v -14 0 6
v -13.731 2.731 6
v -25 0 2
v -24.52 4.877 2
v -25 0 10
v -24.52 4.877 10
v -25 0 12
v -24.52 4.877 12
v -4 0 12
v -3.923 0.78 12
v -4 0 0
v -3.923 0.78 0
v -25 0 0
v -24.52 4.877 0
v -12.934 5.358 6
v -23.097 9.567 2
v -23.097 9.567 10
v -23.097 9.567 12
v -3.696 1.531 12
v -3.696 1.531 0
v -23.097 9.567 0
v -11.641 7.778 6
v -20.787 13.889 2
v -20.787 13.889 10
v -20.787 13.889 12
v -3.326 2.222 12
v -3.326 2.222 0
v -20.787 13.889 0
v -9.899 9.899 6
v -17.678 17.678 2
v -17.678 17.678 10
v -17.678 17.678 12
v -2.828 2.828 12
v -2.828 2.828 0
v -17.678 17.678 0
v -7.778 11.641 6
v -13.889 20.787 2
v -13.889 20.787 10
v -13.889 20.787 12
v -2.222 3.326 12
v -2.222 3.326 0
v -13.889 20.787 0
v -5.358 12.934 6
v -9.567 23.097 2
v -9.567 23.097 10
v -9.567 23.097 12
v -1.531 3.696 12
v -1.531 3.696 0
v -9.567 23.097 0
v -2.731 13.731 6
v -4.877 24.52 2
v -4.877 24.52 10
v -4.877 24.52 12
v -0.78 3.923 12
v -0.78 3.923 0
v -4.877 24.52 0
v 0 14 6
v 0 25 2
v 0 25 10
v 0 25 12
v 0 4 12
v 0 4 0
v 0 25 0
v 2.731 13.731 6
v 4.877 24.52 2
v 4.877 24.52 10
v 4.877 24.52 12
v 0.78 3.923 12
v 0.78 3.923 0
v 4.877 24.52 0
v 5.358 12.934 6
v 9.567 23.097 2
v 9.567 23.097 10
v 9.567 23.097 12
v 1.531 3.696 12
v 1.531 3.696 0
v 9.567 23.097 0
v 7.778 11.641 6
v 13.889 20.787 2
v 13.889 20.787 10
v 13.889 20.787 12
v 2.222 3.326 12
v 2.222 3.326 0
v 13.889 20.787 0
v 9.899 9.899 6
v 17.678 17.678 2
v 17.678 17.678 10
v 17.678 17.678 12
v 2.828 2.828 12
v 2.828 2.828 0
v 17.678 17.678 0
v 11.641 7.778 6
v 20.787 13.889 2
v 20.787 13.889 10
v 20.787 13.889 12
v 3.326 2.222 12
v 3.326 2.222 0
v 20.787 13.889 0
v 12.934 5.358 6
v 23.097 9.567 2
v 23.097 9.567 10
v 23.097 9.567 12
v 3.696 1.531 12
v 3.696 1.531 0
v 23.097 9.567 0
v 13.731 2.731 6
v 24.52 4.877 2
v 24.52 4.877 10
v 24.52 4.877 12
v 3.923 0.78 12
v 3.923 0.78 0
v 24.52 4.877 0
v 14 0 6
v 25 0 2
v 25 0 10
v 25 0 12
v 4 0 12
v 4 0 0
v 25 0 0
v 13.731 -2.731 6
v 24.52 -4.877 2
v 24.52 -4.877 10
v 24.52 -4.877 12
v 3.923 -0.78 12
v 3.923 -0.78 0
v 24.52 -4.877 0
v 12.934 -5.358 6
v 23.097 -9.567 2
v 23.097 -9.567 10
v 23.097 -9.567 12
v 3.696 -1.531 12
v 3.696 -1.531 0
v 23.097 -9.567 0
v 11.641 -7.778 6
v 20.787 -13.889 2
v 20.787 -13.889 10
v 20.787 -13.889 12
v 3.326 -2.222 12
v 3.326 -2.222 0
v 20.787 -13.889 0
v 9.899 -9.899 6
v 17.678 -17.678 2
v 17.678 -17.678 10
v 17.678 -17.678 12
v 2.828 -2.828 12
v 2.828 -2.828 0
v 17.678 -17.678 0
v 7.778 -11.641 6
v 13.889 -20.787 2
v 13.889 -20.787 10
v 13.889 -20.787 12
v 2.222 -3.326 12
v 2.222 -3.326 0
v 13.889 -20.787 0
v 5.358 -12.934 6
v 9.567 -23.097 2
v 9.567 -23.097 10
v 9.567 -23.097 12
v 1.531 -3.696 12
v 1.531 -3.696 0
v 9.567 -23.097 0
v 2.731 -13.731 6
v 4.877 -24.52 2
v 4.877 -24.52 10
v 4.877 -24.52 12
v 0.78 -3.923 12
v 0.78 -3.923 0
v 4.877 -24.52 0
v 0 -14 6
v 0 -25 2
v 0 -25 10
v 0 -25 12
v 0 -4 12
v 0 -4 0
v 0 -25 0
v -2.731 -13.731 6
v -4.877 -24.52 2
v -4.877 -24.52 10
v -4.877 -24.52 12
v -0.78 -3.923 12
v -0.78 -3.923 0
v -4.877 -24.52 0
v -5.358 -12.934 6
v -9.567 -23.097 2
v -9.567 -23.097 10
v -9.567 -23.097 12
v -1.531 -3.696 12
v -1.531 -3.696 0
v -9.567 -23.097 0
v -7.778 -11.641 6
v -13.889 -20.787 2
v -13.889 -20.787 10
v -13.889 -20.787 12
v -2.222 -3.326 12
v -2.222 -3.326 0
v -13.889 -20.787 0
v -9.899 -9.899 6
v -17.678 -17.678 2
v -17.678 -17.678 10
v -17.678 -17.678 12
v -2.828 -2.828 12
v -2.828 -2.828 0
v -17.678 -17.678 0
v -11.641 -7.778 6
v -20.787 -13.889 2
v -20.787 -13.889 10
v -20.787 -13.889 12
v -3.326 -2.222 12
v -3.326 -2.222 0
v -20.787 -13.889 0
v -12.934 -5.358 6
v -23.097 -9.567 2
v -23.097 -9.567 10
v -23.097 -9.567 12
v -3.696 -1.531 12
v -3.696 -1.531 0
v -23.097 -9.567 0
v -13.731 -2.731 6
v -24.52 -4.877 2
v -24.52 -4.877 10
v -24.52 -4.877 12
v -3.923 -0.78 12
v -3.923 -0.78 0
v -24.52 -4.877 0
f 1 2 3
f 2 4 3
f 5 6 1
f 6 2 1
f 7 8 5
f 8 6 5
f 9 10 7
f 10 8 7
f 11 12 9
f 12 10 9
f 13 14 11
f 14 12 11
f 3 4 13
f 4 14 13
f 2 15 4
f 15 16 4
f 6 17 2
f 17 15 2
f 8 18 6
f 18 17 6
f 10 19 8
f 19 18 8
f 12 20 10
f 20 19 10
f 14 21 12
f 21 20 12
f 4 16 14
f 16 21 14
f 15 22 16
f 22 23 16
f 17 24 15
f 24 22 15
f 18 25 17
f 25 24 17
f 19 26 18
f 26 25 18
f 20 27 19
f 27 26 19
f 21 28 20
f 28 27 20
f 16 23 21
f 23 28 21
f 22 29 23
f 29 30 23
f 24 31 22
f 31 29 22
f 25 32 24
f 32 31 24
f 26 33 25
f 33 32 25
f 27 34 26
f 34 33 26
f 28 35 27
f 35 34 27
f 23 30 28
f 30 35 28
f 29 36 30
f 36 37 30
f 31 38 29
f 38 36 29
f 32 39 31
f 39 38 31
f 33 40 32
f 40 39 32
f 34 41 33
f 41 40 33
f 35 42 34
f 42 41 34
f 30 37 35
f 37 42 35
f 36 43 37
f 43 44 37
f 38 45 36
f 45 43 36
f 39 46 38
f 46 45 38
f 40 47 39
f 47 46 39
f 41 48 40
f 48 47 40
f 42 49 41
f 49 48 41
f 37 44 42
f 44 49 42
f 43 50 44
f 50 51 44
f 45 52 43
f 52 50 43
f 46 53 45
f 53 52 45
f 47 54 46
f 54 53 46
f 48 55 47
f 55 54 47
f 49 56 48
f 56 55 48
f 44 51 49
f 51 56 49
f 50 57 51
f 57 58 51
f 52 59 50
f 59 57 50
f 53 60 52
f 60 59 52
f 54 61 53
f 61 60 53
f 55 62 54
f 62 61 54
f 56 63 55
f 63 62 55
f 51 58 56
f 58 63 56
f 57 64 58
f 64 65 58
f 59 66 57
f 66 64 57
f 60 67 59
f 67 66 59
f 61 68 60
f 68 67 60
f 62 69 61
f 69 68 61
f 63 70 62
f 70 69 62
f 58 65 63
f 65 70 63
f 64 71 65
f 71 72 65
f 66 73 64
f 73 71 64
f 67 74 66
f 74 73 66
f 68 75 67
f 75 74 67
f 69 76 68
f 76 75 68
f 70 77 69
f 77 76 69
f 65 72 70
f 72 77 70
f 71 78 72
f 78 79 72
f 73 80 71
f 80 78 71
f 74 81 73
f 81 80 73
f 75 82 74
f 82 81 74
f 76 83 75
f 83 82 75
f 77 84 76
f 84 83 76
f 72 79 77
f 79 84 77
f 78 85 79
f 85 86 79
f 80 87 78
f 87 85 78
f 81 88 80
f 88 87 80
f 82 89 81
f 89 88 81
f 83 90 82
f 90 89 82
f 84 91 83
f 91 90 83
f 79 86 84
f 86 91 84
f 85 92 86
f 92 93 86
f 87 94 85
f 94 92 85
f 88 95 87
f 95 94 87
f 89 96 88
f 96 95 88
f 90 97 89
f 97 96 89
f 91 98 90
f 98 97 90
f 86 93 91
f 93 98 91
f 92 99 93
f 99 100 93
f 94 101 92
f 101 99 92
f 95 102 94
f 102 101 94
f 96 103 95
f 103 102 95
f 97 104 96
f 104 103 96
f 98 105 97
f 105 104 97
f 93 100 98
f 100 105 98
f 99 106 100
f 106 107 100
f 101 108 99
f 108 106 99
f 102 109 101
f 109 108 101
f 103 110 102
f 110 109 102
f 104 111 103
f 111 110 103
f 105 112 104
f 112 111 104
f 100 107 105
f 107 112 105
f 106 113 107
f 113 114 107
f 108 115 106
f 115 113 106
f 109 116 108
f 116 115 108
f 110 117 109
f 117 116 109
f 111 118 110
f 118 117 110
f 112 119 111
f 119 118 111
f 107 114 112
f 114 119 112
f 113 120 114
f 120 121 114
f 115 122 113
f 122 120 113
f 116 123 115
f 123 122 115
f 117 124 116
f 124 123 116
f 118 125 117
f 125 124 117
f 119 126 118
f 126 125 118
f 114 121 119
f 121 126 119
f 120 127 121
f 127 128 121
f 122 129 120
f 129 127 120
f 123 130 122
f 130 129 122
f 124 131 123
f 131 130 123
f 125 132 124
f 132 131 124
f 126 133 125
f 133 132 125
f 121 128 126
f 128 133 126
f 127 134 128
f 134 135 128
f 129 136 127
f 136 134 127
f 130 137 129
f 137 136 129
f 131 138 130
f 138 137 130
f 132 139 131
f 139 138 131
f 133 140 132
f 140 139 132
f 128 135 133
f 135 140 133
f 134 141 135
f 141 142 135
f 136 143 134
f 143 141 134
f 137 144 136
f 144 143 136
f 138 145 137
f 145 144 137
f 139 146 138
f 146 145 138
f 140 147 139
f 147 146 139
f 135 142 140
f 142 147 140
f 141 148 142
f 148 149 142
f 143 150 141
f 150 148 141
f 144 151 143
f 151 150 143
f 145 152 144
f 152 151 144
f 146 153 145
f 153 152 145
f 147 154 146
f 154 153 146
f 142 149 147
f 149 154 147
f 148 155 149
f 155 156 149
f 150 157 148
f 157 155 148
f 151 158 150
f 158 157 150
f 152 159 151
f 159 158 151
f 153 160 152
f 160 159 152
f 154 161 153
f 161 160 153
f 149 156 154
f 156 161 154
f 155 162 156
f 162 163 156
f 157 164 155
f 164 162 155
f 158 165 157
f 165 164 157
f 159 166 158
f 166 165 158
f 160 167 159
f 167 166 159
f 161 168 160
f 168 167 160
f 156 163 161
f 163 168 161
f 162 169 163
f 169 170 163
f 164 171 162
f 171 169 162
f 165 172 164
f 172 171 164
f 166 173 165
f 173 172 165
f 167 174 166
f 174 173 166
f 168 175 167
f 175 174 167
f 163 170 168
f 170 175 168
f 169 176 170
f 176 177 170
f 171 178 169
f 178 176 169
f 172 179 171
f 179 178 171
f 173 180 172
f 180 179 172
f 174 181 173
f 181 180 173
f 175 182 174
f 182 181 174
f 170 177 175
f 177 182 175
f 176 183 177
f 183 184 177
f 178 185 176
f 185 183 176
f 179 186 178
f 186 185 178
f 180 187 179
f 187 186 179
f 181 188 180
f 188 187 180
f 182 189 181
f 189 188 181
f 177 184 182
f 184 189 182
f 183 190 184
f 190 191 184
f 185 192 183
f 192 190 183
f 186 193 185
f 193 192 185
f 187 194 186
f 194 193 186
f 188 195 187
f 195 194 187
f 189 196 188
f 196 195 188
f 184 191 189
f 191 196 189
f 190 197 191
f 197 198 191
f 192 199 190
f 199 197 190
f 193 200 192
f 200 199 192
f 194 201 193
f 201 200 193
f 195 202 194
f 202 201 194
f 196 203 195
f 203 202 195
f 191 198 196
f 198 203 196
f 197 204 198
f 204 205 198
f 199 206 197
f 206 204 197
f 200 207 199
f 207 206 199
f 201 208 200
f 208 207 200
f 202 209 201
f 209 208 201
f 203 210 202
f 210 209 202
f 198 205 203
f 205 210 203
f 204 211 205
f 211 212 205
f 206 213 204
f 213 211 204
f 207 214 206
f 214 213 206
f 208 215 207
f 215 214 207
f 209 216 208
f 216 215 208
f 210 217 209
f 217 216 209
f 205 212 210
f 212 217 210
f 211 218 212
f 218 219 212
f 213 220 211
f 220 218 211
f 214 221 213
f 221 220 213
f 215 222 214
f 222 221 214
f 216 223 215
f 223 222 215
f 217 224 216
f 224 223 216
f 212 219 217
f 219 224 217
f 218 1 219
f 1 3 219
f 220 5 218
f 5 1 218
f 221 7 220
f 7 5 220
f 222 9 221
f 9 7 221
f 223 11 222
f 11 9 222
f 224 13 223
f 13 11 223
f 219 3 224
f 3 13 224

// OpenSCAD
$fn = 32;

// ----------------------------------------------------------------------
// Revolved part: V-groove pulley R25
// ----------------------------------------------------------------------

// --- parameters (mm) ---
bore_r = 4;               // bore radius
rim_r = 25;               // rim radius
rim_t = 12;               // rim width
groove_r = 14;            // groove root radius
groove_w = 4;             // groove half width
revolve_angle = 360;      // revolve sweep, degrees
fit_tol = 0.05;           // declared fit tolerance (prompt contract)
free_tol = 0.2;           // declared free tolerance (prompt contract)

bore_d = 2 * bore_r;
rim_d = 2 * rim_r;
groove_d = 2 * groove_r;

profile = [[4, 0], [25, 0], [25, 2], [14, 6], [25, 10], [25, 12], [4, 12]];  // primary outline, 7 points, counter clockwise

// --- the one profile operation ---
rotate_extrude(angle = revolve_angle) polygon(points = profile);
